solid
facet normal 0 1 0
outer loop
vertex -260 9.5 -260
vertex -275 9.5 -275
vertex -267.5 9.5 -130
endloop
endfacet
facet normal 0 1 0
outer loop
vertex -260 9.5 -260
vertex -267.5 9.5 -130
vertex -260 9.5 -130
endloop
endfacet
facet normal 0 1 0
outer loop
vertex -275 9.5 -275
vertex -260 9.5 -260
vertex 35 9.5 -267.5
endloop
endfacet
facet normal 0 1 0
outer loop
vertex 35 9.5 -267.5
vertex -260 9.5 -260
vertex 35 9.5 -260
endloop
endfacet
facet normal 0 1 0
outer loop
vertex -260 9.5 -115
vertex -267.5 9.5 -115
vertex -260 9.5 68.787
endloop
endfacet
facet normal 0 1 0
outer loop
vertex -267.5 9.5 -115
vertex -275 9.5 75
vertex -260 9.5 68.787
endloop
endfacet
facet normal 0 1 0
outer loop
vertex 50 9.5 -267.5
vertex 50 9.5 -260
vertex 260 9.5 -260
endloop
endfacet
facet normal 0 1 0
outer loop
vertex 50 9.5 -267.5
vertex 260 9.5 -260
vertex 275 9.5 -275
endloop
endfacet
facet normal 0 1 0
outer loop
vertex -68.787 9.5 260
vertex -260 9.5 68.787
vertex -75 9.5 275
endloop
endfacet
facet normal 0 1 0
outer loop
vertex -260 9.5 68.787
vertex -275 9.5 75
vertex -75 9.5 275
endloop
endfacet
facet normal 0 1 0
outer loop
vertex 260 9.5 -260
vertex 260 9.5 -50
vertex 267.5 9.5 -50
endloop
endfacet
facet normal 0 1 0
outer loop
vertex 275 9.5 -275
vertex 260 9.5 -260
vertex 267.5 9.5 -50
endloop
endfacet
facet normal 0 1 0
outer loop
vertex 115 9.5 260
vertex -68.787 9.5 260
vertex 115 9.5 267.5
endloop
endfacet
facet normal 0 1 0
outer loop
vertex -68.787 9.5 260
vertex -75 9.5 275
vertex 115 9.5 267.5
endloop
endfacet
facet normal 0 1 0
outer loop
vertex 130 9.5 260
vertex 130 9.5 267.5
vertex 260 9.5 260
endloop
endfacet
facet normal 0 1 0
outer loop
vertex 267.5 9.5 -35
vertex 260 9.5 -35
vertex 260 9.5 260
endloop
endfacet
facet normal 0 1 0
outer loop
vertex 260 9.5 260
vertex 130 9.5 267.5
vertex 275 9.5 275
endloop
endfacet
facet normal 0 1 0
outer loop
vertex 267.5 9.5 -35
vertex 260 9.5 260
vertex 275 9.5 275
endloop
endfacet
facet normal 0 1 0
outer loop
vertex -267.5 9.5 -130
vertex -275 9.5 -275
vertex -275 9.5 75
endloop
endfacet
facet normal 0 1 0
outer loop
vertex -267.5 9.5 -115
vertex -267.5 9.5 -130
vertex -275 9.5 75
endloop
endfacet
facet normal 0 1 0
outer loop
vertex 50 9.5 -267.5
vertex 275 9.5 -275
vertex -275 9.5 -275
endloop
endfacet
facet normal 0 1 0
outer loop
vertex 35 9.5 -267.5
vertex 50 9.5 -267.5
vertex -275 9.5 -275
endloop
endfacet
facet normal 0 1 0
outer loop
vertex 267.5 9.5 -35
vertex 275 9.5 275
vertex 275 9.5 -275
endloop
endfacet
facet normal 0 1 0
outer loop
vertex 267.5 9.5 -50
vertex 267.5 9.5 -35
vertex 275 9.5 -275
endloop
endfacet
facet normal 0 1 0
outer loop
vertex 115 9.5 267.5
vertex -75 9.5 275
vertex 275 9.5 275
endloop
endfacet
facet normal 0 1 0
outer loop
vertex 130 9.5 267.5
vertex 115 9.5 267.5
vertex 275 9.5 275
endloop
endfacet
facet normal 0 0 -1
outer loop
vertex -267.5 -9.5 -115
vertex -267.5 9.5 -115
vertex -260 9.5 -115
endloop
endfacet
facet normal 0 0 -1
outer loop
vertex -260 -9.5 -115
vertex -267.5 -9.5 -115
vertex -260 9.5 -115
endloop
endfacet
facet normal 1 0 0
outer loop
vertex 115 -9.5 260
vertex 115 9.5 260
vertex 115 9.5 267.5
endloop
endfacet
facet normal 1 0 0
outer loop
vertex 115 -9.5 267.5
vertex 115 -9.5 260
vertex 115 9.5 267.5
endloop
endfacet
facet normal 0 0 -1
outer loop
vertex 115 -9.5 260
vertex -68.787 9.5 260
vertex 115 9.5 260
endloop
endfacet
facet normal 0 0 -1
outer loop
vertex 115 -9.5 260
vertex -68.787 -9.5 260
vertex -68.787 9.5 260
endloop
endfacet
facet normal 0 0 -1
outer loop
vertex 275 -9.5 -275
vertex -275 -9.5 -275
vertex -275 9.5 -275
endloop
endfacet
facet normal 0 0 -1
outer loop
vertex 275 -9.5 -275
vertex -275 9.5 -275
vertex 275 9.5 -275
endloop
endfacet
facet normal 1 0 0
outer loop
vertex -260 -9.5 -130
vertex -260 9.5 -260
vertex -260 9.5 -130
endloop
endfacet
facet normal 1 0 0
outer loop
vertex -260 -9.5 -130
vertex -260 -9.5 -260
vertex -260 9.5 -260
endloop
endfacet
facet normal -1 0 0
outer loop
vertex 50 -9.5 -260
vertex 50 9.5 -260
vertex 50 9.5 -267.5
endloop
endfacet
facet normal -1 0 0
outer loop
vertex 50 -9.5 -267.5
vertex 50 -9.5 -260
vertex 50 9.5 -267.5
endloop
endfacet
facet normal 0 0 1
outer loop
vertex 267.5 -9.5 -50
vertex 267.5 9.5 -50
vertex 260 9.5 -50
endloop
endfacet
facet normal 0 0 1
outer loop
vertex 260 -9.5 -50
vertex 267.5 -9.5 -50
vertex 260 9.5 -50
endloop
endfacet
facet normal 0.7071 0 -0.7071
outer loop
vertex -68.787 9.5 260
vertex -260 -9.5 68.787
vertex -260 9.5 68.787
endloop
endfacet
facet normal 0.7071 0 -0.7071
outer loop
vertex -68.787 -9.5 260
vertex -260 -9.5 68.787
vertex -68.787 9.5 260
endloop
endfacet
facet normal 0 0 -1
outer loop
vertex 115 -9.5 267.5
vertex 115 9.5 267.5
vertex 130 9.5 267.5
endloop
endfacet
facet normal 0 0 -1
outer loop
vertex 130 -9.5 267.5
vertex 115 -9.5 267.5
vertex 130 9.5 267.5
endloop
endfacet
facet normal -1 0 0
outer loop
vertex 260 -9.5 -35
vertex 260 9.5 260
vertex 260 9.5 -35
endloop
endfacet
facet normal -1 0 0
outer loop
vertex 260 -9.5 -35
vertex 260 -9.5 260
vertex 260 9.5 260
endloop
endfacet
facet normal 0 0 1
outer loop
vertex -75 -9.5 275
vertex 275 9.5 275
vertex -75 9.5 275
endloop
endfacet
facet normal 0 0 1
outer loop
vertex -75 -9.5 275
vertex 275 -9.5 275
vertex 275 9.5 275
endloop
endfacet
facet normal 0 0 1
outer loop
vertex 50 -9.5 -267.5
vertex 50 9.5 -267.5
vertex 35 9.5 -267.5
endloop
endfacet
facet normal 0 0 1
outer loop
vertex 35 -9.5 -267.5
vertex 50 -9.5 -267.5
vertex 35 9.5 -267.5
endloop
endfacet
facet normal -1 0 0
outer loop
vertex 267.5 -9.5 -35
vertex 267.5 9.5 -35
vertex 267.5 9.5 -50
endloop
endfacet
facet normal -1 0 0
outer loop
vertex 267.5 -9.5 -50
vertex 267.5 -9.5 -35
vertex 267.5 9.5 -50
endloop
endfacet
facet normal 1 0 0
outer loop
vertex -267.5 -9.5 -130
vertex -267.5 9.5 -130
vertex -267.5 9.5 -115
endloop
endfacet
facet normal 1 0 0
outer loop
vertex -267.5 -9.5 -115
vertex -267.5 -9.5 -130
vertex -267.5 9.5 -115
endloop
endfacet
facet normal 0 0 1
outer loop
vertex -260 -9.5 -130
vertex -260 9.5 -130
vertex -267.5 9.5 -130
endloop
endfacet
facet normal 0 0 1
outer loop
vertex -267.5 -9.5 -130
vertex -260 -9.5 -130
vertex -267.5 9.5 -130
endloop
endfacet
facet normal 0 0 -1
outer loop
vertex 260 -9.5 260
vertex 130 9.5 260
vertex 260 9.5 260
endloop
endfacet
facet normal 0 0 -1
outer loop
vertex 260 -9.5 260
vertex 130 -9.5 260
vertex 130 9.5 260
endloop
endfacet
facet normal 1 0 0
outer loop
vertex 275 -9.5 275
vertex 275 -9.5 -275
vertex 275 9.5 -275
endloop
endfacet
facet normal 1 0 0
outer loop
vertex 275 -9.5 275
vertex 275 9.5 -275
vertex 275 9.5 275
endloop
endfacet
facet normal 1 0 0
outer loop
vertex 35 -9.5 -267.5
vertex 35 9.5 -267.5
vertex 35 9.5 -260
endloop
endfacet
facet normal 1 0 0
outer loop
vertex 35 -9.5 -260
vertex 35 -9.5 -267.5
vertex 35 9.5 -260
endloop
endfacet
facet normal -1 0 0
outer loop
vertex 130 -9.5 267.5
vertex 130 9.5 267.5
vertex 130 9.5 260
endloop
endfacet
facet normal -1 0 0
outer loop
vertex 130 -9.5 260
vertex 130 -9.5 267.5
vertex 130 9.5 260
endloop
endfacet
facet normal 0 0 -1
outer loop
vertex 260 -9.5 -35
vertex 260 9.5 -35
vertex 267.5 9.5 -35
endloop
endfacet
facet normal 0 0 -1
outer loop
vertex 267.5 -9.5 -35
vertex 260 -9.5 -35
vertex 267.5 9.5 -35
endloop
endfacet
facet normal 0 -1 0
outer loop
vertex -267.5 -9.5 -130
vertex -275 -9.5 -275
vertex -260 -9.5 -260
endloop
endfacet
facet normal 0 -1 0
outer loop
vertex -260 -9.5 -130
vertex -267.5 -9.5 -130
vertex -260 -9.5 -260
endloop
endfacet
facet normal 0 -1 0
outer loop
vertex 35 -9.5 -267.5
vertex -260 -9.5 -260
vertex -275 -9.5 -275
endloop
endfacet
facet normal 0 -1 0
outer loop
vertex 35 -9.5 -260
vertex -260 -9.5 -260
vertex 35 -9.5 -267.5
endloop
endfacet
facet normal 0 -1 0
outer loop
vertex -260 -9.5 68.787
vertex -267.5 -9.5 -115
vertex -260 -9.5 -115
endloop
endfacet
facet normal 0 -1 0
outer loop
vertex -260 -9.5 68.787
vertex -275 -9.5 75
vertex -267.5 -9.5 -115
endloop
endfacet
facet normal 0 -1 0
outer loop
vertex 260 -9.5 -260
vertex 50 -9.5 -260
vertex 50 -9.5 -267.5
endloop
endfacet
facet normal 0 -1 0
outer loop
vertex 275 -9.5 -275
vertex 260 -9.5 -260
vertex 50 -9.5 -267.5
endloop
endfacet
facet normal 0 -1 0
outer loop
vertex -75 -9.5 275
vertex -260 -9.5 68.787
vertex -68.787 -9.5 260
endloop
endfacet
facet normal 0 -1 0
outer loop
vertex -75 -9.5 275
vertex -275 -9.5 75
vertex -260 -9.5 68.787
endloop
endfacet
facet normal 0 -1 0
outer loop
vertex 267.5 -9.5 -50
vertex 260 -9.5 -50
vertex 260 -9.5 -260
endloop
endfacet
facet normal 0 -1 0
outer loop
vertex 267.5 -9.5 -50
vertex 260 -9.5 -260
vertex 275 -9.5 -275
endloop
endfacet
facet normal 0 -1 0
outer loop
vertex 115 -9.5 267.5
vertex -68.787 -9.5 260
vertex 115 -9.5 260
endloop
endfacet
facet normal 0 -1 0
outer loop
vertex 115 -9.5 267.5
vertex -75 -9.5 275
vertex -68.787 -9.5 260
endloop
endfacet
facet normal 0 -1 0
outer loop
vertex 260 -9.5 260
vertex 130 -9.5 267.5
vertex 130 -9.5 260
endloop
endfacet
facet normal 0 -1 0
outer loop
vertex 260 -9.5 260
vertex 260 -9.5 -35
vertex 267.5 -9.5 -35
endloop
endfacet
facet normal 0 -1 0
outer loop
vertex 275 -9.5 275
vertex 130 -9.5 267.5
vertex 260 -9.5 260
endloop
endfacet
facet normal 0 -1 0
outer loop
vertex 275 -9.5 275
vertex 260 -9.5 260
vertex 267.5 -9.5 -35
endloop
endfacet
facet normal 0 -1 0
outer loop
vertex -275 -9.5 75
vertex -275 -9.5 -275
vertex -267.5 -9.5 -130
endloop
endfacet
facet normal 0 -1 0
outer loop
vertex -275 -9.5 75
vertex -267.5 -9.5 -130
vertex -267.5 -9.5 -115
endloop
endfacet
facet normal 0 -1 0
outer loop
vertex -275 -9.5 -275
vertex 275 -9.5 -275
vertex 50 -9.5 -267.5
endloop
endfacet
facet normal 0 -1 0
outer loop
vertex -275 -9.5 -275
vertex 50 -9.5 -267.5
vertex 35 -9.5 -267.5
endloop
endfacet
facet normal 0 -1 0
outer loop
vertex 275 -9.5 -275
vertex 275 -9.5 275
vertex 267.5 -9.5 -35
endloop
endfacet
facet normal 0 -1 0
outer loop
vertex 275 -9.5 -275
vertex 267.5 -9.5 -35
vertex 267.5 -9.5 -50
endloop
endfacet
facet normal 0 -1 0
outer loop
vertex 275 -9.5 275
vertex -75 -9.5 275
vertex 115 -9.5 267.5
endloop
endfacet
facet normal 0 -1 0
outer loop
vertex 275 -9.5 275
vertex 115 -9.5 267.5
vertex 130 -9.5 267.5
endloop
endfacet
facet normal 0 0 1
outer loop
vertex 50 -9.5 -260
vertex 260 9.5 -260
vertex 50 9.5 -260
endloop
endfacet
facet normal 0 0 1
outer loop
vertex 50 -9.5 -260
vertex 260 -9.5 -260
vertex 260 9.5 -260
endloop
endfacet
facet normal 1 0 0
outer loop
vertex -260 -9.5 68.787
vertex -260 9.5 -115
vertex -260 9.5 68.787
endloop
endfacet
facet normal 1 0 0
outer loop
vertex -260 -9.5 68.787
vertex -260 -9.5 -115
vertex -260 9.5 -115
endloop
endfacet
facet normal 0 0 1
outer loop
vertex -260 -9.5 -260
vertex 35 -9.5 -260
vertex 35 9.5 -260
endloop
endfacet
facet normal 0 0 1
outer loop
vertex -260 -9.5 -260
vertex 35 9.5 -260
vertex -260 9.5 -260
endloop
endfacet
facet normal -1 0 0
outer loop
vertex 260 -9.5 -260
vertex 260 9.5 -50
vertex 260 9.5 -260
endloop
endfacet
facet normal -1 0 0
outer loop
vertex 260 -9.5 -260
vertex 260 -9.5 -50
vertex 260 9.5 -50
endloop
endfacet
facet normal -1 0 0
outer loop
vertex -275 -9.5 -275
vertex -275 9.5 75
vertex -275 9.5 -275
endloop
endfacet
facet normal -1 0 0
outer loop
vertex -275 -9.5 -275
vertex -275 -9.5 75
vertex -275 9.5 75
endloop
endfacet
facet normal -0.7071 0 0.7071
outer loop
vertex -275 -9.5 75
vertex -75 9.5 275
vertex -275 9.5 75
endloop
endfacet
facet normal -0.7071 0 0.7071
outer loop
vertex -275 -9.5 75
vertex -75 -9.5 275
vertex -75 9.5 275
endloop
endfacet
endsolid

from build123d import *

# Parameters (mm, degrees)
F1_DEPTH = 9.5


with BuildPart() as f1:
    # F0 (on Front) → F1 (new body, symmetric)
    with BuildSketch(Plane.XZ):
        Polygon((-275, 75), (-275, -275), (275, -275), (275, 275), (-75, 275), align=None)
        Polygon((35, -260), (-260, -260), (-260, -130), (-267.5, -130), (-267.5, -115), (-260, -115), (-260, 68.7867965644), (-68.7867965644, 260), (115, 260), (115, 267.5), (130, 267.5), (130, 260), (260, 260), (260, -35), (267.5, -35), (267.5, -50), (260, -50), (260, -260), (50, -260), (50, -267.5), (35, -267.5), align=None, mode=Mode.SUBTRACT)
    extrude(amount=F1_DEPTH, both=True)


solid = f1.part
